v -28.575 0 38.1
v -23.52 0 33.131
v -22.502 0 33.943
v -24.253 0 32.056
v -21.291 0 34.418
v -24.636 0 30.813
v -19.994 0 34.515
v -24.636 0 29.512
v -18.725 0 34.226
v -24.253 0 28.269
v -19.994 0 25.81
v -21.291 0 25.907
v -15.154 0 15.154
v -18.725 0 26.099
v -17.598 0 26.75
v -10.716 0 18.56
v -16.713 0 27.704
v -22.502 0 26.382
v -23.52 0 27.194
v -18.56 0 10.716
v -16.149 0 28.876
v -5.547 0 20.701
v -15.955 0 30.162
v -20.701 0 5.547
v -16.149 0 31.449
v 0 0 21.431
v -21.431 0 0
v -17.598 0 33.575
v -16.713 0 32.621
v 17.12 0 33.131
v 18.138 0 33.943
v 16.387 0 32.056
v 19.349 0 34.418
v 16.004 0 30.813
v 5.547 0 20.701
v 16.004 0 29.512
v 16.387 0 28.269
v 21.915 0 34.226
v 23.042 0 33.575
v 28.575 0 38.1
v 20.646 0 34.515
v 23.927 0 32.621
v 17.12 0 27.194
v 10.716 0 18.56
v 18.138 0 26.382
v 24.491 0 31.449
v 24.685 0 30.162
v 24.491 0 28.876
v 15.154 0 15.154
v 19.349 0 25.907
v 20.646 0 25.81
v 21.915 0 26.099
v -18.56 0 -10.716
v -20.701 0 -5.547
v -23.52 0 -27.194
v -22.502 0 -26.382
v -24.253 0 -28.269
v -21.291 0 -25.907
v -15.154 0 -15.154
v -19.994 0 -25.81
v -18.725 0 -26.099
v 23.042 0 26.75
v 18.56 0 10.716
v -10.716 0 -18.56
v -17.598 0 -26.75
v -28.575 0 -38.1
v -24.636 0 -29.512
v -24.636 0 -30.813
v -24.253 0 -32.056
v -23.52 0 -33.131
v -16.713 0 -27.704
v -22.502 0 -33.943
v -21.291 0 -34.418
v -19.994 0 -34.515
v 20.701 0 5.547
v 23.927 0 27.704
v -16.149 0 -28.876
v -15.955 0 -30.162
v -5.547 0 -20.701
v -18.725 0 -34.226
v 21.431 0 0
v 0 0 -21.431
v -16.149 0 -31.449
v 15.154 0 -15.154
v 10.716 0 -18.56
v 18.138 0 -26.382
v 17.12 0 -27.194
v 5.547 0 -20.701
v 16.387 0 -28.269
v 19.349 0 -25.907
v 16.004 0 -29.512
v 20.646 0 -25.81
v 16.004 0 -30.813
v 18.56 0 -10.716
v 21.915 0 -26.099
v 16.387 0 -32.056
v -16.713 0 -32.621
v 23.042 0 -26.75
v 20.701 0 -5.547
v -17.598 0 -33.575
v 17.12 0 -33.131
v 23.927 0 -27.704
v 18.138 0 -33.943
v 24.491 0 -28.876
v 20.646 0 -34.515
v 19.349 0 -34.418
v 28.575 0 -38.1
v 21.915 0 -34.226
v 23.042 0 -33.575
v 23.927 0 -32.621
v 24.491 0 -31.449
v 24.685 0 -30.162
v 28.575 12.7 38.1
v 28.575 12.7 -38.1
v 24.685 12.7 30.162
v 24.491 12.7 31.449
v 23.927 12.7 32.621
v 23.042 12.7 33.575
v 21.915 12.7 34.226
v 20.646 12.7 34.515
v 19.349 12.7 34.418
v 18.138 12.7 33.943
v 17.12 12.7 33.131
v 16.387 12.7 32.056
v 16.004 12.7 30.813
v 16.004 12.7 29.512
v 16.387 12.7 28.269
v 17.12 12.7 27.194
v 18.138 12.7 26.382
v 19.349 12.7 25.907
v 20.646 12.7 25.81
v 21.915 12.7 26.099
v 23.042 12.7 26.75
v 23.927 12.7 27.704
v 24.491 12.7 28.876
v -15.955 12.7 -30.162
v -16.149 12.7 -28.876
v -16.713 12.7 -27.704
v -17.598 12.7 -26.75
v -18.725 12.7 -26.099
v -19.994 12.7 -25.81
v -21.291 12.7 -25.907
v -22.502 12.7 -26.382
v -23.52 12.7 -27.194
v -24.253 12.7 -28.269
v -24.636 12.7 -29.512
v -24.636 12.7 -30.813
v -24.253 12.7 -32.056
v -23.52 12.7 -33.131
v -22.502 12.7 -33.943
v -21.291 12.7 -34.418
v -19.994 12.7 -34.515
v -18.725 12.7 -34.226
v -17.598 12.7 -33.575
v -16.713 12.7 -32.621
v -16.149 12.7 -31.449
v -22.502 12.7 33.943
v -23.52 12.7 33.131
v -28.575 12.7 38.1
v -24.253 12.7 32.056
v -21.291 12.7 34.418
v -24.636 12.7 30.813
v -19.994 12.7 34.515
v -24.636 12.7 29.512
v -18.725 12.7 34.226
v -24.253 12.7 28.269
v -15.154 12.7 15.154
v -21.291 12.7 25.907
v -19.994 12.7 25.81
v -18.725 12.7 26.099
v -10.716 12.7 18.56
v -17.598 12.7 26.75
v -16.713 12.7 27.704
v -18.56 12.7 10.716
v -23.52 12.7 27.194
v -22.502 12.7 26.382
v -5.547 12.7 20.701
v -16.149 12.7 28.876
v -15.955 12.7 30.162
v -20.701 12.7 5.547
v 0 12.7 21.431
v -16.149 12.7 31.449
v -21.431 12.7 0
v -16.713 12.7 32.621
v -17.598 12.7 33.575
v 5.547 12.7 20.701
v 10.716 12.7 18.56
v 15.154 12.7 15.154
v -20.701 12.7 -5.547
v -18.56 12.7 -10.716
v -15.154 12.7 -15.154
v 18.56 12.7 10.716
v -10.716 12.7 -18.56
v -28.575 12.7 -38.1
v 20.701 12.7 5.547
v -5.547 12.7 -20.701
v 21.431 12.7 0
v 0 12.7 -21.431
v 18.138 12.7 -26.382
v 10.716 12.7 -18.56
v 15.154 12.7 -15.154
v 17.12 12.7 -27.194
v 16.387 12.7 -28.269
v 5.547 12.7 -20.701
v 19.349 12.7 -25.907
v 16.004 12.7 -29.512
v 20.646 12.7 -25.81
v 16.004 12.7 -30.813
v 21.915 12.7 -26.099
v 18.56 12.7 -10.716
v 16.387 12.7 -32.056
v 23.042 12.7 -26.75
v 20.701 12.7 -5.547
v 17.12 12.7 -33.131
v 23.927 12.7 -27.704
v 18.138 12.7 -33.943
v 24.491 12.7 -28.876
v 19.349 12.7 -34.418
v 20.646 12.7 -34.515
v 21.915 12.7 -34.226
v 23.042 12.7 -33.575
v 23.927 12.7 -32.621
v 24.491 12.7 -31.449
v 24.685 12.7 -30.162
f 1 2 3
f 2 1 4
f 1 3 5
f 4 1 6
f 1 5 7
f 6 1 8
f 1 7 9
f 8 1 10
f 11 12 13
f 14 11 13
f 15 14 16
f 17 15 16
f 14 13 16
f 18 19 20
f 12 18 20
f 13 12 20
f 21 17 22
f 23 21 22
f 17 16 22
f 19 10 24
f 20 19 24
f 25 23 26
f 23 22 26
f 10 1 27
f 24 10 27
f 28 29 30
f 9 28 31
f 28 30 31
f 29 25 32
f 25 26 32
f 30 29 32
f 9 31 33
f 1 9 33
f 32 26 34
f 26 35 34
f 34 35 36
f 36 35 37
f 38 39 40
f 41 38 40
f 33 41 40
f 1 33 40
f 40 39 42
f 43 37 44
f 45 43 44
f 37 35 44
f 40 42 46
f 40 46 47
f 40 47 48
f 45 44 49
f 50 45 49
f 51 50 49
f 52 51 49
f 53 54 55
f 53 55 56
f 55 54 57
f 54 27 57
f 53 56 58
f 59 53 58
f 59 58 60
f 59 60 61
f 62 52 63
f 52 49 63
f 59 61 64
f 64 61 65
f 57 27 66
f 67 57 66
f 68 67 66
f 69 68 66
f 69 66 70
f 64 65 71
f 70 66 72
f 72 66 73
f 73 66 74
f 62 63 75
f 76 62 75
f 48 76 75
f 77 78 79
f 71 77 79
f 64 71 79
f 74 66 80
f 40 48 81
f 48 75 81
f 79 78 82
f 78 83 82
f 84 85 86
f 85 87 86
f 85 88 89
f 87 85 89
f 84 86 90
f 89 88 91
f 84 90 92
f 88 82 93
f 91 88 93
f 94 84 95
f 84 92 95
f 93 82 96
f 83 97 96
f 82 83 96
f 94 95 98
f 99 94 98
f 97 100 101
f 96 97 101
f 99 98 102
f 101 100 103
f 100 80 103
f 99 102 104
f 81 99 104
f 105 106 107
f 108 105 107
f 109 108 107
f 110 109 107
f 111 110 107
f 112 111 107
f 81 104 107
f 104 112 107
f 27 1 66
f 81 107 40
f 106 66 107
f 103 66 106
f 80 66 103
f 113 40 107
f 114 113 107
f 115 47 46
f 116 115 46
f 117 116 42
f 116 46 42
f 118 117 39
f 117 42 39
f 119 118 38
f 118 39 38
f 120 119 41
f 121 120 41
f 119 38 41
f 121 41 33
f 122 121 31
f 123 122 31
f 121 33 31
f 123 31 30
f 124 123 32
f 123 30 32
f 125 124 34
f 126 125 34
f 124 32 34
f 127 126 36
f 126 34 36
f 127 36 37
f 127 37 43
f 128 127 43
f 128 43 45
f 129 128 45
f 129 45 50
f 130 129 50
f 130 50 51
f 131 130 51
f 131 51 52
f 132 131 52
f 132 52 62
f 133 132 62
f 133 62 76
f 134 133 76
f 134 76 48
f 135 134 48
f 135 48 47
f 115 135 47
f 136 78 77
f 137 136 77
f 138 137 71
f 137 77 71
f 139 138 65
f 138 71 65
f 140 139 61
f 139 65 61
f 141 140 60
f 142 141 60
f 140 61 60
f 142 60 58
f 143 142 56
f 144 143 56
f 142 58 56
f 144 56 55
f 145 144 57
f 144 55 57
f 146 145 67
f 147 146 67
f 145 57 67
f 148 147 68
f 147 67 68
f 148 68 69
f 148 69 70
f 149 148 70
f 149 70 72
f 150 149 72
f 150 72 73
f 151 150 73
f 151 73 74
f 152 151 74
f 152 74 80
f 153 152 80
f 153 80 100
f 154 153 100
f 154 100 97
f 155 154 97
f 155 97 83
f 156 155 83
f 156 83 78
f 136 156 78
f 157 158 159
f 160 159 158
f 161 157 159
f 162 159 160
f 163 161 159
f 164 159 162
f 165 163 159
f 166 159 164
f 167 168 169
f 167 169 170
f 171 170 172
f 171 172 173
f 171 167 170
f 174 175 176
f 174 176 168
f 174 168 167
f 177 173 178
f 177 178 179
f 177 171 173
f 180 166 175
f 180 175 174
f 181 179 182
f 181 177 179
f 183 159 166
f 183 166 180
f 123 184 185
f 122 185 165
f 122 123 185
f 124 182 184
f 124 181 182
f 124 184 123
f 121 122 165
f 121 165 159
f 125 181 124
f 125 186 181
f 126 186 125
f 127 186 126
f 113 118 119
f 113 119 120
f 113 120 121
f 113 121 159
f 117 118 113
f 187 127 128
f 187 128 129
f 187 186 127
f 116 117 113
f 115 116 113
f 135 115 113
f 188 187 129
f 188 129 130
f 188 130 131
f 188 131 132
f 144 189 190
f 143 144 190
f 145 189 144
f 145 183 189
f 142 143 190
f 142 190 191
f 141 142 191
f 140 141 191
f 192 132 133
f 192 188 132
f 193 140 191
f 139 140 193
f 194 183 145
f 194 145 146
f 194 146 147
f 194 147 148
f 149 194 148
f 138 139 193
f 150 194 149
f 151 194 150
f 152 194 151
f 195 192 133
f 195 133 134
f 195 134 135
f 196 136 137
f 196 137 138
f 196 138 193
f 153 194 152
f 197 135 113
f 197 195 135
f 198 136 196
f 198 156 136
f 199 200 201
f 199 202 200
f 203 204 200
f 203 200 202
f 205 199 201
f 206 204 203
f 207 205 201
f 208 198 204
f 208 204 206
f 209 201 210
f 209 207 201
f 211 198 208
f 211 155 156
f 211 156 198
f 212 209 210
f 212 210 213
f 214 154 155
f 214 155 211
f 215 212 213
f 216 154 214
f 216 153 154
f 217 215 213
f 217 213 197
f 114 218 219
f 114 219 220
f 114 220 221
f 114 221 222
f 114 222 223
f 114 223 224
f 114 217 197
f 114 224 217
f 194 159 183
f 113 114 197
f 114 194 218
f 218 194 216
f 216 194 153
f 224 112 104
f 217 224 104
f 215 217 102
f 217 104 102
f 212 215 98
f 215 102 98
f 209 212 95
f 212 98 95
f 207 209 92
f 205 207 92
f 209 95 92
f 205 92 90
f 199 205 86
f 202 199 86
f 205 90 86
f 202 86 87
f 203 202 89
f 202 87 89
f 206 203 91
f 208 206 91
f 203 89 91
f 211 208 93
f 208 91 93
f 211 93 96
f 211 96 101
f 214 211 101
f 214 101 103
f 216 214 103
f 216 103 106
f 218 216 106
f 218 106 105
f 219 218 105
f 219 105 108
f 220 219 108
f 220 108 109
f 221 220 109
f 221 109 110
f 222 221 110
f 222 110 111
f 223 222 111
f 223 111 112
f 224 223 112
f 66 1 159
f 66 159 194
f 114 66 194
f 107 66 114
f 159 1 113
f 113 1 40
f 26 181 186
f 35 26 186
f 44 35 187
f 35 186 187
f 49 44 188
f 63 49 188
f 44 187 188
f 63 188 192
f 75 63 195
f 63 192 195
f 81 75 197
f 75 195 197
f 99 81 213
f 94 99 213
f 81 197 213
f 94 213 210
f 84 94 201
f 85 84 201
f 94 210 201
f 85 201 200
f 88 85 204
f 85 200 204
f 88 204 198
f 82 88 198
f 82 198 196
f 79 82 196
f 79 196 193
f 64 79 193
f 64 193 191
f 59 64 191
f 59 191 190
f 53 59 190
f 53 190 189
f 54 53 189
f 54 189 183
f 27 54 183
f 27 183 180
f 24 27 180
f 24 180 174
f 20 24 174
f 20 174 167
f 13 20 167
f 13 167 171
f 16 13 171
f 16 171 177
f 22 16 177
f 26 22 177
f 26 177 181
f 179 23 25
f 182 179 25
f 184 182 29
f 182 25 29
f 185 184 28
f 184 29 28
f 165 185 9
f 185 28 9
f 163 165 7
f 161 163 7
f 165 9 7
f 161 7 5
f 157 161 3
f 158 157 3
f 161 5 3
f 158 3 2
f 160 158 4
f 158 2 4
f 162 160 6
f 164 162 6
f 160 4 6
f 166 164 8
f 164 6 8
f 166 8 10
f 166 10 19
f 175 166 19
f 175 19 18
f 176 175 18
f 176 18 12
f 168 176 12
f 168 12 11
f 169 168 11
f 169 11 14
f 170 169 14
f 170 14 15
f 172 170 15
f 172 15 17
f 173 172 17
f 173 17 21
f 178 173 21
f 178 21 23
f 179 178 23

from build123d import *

# Parameters (mm, degrees)
SKETCH1_W                = 57.15
SKETCH1_H                = 76.2
EXTRUDE1_DEPTH           = 12.7
SKETCH9_R                = 21.43125
CUT_EXTRUDE1_DEPTH       = 50.289254661
F_5_16_CLEARANCE_HOLE1_D = 8.72998


with BuildPart() as part:
    # Sketch1 → Extrude1 (new body)
    with BuildSketch(Plane(origin=(0, 0, 0), x_dir=(1, 0, 0), z_dir=(0, 1, 0))):
        Rectangle(SKETCH1_W, SKETCH1_H)
    extrude(amount=EXTRUDE1_DEPTH)

    # Sketch9 → Cut-Extrude1 (cut, through all)
    with BuildSketch(Plane(origin=(0, 12.7, 0), x_dir=(-1, 0, 0), z_dir=(0, 1, 0))):
        with Locations(Location((0, 0, 0), (0, 0, 90))):
            Circle(SKETCH9_R)
    extrude(amount=-CUT_EXTRUDE1_DEPTH, mode=Mode.SUBTRACT)

    # 5/16 Clearance Hole1 (through all)
    with Locations(Plane(origin=(0, 12.7, 0), x_dir=(-1, 0, 0), z_dir=(0, 1, 0))):
        with Locations((20.32, -30.1625), (-20.32, -30.1625), (-20.32, 30.1625), (20.32, 30.1625)):
            Hole(F_5_16_CLEARANCE_HOLE1_D / 2)


solid = part.part
